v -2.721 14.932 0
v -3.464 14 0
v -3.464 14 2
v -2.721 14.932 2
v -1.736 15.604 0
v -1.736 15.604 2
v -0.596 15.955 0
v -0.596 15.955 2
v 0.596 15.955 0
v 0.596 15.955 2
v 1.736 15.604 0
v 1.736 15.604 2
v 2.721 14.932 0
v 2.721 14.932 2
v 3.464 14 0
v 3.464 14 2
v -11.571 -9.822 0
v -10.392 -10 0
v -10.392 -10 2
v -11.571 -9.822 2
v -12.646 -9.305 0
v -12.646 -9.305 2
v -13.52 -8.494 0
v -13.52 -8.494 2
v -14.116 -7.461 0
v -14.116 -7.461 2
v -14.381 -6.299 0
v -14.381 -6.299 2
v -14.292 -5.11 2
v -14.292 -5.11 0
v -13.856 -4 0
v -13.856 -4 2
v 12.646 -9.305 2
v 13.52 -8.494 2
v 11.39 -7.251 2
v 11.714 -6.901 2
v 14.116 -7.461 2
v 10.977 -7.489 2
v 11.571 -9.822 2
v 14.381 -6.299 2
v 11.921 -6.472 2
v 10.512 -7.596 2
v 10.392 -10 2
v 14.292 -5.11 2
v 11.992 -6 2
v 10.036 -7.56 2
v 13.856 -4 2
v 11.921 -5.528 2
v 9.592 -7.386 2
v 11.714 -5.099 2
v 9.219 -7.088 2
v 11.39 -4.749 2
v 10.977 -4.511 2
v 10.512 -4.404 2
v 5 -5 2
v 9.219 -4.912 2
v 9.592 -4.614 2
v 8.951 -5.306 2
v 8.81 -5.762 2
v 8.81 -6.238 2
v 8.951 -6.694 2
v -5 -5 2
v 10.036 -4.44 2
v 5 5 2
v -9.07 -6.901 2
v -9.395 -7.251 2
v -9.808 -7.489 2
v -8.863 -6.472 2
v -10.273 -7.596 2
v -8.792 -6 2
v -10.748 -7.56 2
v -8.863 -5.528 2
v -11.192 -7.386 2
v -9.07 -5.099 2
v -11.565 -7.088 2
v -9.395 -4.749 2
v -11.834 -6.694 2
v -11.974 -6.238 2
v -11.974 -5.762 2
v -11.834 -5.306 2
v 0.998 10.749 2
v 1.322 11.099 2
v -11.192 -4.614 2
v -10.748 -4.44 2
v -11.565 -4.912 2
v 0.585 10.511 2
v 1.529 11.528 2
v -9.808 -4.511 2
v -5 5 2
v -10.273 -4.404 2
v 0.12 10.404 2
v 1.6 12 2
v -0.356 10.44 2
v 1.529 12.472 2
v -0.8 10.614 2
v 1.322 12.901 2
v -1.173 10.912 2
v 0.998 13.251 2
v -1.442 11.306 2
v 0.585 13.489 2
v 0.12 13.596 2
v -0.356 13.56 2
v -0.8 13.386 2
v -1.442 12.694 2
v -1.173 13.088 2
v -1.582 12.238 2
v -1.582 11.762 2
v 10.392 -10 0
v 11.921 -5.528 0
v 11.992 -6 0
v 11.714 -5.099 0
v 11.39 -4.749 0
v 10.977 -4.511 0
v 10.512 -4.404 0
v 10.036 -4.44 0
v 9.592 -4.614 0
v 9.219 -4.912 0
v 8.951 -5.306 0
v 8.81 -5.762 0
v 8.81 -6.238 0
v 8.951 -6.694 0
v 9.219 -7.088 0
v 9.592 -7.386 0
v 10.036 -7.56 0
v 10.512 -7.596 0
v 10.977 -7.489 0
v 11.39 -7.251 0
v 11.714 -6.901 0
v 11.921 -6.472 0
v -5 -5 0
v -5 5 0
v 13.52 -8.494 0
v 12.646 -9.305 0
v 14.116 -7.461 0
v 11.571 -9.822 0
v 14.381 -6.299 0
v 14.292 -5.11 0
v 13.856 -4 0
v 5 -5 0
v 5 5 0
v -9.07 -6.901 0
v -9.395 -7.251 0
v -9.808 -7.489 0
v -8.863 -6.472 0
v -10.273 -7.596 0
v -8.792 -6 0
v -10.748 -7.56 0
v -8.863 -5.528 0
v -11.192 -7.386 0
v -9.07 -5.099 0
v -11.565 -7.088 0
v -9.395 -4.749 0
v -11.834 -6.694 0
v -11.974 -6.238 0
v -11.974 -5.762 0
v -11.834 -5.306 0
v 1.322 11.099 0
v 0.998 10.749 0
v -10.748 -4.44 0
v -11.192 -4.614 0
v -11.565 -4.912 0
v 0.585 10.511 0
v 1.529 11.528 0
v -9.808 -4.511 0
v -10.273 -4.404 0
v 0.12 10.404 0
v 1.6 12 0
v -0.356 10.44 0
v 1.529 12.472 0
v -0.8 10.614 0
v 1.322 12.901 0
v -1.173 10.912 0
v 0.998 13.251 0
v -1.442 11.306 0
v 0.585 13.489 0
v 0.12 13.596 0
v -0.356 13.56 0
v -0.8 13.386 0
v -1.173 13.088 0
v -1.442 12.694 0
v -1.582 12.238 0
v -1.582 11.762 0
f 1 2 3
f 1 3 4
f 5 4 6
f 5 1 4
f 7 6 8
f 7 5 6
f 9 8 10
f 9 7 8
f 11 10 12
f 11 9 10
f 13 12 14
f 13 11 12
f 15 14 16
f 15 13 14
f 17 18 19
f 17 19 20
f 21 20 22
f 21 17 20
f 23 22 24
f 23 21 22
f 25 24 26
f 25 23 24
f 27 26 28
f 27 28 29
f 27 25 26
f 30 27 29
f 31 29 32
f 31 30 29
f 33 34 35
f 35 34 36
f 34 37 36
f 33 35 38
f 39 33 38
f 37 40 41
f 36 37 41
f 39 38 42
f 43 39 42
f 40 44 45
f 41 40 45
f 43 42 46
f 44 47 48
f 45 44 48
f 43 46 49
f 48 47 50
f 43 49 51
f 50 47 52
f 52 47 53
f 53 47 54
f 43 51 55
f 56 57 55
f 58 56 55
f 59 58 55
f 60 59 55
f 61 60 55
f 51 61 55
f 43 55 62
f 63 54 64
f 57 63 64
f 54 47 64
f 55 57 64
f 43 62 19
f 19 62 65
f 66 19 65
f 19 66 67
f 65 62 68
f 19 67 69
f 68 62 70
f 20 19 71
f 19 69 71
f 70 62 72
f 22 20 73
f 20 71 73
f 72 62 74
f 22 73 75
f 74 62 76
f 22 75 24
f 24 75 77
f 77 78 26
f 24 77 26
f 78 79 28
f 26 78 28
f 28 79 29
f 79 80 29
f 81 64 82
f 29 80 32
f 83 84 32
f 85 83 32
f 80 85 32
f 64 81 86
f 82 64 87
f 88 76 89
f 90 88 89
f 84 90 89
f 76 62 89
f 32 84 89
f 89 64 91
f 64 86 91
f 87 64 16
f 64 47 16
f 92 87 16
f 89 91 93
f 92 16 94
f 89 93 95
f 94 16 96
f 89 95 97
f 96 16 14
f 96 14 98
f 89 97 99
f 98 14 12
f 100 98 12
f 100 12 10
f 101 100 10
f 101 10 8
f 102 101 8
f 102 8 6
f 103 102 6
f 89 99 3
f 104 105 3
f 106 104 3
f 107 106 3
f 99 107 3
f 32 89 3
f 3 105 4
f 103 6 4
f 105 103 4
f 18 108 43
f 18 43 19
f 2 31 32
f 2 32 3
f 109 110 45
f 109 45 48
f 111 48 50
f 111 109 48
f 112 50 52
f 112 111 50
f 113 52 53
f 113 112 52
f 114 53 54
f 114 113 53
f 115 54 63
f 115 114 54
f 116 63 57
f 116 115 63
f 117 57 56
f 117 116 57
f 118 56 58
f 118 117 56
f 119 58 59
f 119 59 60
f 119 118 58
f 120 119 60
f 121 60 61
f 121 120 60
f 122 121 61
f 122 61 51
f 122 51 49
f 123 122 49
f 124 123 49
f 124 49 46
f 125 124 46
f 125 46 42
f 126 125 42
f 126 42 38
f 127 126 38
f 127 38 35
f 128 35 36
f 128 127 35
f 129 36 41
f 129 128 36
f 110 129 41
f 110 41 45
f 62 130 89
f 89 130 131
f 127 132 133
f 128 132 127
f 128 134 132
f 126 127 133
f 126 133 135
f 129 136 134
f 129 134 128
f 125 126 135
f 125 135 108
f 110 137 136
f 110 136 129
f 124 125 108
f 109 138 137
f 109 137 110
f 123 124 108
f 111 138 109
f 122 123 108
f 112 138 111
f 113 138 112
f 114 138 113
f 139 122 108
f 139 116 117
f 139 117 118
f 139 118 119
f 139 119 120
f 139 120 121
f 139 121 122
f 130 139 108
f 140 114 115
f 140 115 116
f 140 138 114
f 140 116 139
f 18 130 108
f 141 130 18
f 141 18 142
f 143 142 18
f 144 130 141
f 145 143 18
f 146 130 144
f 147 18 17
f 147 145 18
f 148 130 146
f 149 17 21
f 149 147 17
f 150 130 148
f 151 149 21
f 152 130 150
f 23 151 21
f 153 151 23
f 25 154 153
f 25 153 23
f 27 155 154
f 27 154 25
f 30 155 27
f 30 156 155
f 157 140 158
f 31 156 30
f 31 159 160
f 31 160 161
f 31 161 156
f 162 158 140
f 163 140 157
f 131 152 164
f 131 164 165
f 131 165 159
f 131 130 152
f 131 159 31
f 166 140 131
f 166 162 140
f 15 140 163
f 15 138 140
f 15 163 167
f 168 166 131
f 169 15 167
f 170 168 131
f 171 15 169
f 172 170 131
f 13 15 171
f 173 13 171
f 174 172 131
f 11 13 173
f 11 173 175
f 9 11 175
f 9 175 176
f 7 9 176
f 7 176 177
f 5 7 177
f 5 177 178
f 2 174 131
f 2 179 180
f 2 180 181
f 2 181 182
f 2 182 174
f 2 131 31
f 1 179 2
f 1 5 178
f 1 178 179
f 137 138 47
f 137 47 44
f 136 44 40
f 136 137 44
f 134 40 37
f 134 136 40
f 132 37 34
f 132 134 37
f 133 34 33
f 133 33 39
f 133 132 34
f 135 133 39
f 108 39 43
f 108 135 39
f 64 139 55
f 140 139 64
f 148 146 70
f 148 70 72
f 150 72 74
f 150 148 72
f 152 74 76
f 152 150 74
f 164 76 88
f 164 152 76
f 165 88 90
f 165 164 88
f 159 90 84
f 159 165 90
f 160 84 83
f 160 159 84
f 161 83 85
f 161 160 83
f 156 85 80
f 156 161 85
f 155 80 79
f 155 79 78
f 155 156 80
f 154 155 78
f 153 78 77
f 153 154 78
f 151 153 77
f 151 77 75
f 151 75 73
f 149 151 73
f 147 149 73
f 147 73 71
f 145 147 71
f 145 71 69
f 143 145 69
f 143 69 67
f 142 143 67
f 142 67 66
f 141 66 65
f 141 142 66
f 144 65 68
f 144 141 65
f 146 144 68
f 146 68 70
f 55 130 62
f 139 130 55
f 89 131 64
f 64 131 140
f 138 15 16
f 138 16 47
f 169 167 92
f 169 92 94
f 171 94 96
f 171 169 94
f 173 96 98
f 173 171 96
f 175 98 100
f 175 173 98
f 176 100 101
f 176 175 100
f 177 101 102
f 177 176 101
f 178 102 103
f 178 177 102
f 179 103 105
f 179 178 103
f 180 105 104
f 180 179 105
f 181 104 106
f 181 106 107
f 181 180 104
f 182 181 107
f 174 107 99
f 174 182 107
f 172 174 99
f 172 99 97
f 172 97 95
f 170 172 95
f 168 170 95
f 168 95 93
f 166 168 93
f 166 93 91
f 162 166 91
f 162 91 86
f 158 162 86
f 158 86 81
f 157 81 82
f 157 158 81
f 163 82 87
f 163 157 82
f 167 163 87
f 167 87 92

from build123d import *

# Parameters (mm, degrees)
SKETCH_1_R      = 1.6
SKETCH_1_W      = 10
SKETCH_1_H      = 10
EXTRUDE_1_DEPTH = 2


with BuildPart() as part:
    # ｽｹｯﾁ1 → ﾎﾞｽ - 押し出し1 (new body)
    with BuildSketch(Plane.XY):
        with BuildLine():
            Line((-13.856406461, -4), (-3.464101615, 14))
            ThreePointArc((-3.464101615, 14), (0, 16), (3.464101615, 14))
            Line((3.464101615, 14), (13.856406461, -4))
            ThreePointArc((13.856406461, -4), (13.856406461, -8), (10.392304845, -10))
            Line((10.392304845, -10), (-10.392304845, -10))
            ThreePointArc((-10.392304845, -10), (-13.856406461, -8), (-13.856406461, -4))
        make_face()
        with Locations((0, 12)):
            Circle(SKETCH_1_R, mode=Mode.SUBTRACT)
        with Locations((10.392304845, -6)):
            Circle(SKETCH_1_R, mode=Mode.SUBTRACT)
        with Locations((-10.392304845, -6)):
            Circle(SKETCH_1_R, mode=Mode.SUBTRACT)
        Rectangle(SKETCH_1_W, SKETCH_1_H, mode=Mode.SUBTRACT)
    extrude(amount=EXTRUDE_1_DEPTH)


solid = part.part
